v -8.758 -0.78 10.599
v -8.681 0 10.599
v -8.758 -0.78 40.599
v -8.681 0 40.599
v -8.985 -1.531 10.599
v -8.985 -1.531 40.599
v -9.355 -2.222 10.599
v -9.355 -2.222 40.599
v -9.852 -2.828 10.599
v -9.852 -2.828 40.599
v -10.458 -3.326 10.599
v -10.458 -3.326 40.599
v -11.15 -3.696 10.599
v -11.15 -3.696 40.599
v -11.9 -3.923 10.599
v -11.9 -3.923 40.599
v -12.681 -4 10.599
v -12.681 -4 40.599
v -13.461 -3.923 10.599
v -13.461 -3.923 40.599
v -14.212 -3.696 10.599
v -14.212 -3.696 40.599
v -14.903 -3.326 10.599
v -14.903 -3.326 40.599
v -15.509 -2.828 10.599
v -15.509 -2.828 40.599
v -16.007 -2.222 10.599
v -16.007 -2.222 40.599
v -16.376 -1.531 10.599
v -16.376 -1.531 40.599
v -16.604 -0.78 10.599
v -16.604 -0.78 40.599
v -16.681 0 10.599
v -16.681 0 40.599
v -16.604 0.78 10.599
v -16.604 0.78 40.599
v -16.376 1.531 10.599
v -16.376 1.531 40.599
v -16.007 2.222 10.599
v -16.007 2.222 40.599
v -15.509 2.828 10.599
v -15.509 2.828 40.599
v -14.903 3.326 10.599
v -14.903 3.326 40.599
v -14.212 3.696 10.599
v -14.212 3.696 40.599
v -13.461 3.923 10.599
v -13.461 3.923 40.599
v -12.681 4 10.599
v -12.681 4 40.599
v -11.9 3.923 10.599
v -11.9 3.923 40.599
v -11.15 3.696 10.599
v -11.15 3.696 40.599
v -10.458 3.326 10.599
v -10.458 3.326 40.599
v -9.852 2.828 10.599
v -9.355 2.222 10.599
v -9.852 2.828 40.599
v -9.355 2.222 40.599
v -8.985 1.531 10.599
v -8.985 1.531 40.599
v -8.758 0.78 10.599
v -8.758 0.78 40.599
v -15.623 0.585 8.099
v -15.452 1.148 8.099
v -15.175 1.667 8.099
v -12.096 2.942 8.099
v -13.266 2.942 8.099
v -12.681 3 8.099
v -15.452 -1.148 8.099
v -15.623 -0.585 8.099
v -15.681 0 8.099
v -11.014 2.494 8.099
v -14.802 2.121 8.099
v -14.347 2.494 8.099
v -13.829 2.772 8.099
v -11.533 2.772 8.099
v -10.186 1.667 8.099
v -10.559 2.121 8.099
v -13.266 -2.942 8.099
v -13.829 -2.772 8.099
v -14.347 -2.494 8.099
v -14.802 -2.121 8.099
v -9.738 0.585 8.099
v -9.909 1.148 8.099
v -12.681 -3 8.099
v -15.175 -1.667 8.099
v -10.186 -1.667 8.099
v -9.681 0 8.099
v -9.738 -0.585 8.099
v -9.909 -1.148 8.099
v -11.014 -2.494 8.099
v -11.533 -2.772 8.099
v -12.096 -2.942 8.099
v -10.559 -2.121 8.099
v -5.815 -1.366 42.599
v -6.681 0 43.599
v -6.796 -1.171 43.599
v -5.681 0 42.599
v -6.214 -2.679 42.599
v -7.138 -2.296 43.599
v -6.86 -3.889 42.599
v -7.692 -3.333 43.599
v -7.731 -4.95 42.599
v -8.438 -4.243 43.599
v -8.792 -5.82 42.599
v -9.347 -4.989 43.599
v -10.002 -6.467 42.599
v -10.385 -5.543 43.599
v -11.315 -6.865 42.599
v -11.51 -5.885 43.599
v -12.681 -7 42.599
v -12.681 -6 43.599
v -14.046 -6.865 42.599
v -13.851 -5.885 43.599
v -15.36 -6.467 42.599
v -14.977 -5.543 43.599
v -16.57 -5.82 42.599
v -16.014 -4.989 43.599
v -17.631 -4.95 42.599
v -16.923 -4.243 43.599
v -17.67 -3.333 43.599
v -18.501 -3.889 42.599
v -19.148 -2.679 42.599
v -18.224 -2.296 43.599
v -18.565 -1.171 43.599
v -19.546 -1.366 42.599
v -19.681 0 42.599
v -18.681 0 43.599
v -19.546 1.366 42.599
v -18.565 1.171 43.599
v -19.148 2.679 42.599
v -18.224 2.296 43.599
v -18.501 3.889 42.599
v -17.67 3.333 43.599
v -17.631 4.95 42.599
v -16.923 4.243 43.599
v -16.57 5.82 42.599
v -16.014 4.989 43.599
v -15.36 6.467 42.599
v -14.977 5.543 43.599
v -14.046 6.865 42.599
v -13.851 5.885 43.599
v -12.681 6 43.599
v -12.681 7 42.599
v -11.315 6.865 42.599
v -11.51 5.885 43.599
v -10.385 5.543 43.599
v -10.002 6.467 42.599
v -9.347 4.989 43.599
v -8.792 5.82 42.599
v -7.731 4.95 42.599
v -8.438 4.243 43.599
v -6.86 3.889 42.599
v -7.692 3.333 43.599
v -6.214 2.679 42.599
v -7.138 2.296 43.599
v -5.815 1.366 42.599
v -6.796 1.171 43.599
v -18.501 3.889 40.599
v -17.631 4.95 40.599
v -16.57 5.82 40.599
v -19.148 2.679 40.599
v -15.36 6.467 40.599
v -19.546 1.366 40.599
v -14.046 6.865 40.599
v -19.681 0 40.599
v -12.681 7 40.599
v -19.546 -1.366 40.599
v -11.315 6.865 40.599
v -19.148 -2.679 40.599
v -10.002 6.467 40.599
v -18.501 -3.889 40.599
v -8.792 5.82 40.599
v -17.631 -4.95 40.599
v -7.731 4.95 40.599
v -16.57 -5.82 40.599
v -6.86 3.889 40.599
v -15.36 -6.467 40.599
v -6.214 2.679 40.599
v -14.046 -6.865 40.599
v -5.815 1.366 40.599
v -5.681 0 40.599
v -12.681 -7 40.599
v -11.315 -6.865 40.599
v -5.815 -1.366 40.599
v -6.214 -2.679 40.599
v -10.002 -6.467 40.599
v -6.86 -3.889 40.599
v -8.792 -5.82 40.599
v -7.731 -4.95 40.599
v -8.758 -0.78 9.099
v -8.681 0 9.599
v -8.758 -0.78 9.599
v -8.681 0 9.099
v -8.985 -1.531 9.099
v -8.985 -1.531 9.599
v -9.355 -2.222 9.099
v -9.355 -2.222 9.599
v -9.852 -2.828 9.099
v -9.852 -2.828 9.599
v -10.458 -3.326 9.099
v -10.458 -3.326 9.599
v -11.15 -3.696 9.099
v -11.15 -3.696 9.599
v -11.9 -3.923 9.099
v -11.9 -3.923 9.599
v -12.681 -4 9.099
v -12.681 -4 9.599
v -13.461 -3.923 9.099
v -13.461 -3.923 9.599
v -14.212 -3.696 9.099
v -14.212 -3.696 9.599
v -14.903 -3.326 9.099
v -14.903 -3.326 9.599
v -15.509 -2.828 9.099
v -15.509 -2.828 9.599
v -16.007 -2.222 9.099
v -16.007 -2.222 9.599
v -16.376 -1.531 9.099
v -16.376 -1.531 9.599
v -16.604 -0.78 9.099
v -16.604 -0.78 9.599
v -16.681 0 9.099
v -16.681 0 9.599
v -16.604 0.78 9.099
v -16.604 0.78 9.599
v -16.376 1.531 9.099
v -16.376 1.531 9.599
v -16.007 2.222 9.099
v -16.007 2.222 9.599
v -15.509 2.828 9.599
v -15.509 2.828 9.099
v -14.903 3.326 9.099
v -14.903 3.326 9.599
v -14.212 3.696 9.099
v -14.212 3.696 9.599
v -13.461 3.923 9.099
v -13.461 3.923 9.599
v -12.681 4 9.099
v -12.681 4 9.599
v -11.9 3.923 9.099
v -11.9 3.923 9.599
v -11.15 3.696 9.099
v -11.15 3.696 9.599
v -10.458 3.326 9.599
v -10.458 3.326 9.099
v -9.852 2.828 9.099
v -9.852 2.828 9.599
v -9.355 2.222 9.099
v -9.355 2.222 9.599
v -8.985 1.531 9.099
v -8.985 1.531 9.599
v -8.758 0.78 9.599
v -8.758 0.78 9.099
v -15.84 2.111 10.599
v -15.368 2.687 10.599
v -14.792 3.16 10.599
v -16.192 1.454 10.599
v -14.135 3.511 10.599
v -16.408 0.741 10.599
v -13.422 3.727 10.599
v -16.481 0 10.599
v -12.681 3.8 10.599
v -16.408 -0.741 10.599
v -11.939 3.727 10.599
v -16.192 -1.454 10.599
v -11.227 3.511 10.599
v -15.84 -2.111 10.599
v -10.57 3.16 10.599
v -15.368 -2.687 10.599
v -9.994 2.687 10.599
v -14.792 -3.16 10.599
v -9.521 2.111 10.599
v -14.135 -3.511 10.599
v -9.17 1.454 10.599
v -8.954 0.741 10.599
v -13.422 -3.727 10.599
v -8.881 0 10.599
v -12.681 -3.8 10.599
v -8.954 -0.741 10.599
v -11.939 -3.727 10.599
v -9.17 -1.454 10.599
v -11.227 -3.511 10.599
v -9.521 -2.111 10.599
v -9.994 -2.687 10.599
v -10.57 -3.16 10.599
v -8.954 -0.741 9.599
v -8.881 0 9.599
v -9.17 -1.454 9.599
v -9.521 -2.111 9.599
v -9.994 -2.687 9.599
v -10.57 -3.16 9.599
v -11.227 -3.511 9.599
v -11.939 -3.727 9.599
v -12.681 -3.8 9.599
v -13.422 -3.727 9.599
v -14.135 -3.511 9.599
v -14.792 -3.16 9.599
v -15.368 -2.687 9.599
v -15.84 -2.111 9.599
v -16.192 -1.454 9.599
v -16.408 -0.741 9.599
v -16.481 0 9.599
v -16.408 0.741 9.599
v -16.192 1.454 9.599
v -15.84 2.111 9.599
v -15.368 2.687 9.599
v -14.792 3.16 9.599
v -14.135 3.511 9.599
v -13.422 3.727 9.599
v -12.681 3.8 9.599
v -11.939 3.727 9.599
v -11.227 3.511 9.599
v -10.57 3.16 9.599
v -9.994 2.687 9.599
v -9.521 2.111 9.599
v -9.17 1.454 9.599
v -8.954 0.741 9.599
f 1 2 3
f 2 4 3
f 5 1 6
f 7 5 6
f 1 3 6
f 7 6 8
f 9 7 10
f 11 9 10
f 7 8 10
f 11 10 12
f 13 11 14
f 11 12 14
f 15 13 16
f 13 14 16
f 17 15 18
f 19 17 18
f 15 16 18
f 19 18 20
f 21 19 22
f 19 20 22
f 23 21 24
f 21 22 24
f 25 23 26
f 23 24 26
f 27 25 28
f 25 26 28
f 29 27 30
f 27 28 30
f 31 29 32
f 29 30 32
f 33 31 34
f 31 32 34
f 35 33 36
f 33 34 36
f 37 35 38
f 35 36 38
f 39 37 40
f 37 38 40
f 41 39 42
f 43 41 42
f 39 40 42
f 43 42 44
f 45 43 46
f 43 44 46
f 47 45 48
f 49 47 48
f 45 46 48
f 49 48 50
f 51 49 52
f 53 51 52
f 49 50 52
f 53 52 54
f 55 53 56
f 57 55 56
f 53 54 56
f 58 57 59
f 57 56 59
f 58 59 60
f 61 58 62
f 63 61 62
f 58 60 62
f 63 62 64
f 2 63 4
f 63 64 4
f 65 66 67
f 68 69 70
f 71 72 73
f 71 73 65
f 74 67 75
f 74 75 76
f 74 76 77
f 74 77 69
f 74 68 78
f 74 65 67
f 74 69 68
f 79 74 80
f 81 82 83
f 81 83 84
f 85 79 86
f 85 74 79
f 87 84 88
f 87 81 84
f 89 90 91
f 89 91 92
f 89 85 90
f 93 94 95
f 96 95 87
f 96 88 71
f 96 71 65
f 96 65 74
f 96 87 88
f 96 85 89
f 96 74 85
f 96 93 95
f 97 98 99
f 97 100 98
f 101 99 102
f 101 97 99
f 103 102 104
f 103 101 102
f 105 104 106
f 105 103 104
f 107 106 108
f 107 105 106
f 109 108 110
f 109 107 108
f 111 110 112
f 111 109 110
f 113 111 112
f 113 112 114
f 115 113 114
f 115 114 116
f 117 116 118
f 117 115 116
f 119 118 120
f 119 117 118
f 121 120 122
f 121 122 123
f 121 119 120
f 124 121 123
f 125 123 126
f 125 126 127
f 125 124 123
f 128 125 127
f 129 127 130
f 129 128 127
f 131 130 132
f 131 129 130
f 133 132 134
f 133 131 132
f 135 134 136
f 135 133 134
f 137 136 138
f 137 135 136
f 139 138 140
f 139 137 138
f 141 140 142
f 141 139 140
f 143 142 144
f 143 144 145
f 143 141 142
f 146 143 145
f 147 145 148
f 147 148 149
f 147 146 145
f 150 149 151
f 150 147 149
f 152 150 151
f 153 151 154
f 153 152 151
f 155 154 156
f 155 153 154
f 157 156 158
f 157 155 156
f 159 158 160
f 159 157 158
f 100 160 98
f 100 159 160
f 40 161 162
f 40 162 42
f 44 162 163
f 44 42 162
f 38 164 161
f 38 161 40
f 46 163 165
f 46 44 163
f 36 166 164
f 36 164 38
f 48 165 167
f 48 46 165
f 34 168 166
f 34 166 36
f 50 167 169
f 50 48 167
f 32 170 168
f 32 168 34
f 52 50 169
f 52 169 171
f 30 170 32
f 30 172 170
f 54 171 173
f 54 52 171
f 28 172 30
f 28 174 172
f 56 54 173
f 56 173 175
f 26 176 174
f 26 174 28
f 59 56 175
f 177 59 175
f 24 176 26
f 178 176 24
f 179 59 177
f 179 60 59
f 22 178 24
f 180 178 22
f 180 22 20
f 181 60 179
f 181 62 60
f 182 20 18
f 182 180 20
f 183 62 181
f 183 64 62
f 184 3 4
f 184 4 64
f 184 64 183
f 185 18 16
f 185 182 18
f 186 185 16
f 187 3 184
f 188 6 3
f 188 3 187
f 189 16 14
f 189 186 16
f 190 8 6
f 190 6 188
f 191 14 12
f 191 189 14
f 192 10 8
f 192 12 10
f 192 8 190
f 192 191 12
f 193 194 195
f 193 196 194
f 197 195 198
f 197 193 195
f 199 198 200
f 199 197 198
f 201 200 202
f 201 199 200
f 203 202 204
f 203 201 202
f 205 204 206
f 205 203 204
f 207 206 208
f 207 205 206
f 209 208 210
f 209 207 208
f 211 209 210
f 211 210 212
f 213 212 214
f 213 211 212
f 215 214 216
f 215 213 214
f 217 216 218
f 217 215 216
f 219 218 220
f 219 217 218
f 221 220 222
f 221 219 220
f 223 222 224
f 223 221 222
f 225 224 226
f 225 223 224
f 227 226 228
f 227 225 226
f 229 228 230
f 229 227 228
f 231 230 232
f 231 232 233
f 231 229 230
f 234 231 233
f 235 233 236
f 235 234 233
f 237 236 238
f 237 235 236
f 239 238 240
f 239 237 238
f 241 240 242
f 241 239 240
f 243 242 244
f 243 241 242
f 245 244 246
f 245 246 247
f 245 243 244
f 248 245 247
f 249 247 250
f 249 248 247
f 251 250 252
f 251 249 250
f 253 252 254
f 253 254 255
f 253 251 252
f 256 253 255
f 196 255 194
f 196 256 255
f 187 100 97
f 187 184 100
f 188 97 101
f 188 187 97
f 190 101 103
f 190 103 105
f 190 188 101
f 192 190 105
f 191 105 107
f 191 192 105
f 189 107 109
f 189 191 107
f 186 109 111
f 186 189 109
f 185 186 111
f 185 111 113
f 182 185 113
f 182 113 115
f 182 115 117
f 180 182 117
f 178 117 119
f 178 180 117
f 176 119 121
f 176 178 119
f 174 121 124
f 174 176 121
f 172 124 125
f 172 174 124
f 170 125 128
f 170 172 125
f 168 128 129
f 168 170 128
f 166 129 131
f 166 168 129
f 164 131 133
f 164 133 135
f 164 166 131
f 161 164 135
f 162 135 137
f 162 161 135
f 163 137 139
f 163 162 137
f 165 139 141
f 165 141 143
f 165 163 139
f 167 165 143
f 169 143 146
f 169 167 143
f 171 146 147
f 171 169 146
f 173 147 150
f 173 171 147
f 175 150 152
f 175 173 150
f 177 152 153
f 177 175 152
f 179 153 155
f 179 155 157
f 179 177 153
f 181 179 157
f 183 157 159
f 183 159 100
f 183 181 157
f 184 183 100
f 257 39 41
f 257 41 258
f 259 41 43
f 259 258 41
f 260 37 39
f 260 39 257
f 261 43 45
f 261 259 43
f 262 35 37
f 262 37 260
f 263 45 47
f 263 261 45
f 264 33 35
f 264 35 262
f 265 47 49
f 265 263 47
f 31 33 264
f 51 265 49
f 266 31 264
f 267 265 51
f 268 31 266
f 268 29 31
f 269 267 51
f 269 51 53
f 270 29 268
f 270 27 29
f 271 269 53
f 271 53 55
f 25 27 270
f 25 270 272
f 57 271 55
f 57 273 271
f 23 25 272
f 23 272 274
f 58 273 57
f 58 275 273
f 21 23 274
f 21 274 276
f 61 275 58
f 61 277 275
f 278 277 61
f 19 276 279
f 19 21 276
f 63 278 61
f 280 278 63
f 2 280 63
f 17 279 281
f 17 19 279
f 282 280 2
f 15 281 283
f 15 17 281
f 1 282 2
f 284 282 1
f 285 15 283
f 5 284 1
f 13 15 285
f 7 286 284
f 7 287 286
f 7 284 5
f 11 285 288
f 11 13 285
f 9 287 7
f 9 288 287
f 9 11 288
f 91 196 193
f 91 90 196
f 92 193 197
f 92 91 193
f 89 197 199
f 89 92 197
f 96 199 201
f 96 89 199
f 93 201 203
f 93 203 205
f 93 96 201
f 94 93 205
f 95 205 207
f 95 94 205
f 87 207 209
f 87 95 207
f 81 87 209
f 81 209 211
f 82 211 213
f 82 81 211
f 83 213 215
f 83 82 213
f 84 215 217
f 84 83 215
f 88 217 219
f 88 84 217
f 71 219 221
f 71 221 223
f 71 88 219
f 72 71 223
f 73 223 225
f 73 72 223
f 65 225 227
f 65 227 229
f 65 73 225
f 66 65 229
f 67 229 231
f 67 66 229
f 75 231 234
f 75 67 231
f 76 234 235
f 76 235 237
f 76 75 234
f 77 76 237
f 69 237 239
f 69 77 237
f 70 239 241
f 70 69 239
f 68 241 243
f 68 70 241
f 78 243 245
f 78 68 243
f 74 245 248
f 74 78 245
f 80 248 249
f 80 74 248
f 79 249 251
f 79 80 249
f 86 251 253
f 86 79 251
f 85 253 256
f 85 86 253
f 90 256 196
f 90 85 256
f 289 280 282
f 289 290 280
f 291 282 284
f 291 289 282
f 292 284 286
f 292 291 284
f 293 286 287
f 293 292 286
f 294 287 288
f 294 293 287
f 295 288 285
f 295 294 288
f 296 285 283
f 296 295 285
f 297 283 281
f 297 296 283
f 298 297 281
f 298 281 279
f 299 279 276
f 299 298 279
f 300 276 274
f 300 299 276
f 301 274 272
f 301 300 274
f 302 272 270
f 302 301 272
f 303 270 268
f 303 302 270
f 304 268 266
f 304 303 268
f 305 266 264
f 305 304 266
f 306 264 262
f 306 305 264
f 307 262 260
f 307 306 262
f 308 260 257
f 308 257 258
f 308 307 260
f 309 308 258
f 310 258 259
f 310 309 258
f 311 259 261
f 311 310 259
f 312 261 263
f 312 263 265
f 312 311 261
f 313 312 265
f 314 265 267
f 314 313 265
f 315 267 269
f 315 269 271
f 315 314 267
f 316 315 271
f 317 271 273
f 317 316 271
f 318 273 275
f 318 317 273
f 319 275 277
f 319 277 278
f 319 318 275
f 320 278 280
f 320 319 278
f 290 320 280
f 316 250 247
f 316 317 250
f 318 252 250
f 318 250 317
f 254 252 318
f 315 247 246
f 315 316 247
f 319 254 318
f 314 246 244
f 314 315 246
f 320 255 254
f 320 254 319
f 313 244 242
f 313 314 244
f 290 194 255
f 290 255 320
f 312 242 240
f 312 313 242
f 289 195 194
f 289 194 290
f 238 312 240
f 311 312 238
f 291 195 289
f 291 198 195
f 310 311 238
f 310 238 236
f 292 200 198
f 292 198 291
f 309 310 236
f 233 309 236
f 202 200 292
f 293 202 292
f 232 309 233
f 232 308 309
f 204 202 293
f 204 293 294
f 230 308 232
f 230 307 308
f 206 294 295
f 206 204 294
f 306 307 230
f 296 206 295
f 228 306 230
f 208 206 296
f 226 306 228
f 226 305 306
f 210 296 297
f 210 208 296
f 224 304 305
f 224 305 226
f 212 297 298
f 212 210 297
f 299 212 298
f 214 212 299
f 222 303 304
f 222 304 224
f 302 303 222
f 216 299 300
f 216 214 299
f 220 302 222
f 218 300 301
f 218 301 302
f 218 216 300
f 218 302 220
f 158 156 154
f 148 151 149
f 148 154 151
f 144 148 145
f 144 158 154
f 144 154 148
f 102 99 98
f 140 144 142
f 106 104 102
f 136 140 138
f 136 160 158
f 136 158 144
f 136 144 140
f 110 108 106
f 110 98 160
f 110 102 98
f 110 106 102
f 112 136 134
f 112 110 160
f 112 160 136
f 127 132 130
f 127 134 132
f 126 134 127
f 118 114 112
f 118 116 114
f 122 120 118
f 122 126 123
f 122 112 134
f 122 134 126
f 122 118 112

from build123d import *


with BuildPart() as part:
    # Esquisse2 → Base-Révolution (revolve)
    with BuildSketch(Plane(origin=(0, 0, 0), x_dir=(1, 0, 0), z_dir=(0, 1, 0)), mode=Mode.PRIVATE) as base_r_volution_sk:
        Polygon((-16.680780303, -30.626231876), (-16.680780303, -10.599160722), (-16.480780303, -10.599160722), (-16.480780303, -9.599160722), (-16.680780303, -9.599160722), (-16.680780303, -9.099160722), (-15.680780303, -8.099160722), (-12.680780303, -8.099160722), (-12.680780303, -43.599160722), (-18.680780303, -43.599160722), (-19.680780303, -42.599160722), (-19.680780303, -40.599160722), (-16.680780303, -40.599160722), align=None)
    revolve(base_r_volution_sk.sketch.rotate(Axis((-12.680780303, 0, 67.53791491), (0, 0, -1)), 180), axis=Axis((-12.680780303, 0, 67.53791491), (0, 0, -1)))


solid = part.part
